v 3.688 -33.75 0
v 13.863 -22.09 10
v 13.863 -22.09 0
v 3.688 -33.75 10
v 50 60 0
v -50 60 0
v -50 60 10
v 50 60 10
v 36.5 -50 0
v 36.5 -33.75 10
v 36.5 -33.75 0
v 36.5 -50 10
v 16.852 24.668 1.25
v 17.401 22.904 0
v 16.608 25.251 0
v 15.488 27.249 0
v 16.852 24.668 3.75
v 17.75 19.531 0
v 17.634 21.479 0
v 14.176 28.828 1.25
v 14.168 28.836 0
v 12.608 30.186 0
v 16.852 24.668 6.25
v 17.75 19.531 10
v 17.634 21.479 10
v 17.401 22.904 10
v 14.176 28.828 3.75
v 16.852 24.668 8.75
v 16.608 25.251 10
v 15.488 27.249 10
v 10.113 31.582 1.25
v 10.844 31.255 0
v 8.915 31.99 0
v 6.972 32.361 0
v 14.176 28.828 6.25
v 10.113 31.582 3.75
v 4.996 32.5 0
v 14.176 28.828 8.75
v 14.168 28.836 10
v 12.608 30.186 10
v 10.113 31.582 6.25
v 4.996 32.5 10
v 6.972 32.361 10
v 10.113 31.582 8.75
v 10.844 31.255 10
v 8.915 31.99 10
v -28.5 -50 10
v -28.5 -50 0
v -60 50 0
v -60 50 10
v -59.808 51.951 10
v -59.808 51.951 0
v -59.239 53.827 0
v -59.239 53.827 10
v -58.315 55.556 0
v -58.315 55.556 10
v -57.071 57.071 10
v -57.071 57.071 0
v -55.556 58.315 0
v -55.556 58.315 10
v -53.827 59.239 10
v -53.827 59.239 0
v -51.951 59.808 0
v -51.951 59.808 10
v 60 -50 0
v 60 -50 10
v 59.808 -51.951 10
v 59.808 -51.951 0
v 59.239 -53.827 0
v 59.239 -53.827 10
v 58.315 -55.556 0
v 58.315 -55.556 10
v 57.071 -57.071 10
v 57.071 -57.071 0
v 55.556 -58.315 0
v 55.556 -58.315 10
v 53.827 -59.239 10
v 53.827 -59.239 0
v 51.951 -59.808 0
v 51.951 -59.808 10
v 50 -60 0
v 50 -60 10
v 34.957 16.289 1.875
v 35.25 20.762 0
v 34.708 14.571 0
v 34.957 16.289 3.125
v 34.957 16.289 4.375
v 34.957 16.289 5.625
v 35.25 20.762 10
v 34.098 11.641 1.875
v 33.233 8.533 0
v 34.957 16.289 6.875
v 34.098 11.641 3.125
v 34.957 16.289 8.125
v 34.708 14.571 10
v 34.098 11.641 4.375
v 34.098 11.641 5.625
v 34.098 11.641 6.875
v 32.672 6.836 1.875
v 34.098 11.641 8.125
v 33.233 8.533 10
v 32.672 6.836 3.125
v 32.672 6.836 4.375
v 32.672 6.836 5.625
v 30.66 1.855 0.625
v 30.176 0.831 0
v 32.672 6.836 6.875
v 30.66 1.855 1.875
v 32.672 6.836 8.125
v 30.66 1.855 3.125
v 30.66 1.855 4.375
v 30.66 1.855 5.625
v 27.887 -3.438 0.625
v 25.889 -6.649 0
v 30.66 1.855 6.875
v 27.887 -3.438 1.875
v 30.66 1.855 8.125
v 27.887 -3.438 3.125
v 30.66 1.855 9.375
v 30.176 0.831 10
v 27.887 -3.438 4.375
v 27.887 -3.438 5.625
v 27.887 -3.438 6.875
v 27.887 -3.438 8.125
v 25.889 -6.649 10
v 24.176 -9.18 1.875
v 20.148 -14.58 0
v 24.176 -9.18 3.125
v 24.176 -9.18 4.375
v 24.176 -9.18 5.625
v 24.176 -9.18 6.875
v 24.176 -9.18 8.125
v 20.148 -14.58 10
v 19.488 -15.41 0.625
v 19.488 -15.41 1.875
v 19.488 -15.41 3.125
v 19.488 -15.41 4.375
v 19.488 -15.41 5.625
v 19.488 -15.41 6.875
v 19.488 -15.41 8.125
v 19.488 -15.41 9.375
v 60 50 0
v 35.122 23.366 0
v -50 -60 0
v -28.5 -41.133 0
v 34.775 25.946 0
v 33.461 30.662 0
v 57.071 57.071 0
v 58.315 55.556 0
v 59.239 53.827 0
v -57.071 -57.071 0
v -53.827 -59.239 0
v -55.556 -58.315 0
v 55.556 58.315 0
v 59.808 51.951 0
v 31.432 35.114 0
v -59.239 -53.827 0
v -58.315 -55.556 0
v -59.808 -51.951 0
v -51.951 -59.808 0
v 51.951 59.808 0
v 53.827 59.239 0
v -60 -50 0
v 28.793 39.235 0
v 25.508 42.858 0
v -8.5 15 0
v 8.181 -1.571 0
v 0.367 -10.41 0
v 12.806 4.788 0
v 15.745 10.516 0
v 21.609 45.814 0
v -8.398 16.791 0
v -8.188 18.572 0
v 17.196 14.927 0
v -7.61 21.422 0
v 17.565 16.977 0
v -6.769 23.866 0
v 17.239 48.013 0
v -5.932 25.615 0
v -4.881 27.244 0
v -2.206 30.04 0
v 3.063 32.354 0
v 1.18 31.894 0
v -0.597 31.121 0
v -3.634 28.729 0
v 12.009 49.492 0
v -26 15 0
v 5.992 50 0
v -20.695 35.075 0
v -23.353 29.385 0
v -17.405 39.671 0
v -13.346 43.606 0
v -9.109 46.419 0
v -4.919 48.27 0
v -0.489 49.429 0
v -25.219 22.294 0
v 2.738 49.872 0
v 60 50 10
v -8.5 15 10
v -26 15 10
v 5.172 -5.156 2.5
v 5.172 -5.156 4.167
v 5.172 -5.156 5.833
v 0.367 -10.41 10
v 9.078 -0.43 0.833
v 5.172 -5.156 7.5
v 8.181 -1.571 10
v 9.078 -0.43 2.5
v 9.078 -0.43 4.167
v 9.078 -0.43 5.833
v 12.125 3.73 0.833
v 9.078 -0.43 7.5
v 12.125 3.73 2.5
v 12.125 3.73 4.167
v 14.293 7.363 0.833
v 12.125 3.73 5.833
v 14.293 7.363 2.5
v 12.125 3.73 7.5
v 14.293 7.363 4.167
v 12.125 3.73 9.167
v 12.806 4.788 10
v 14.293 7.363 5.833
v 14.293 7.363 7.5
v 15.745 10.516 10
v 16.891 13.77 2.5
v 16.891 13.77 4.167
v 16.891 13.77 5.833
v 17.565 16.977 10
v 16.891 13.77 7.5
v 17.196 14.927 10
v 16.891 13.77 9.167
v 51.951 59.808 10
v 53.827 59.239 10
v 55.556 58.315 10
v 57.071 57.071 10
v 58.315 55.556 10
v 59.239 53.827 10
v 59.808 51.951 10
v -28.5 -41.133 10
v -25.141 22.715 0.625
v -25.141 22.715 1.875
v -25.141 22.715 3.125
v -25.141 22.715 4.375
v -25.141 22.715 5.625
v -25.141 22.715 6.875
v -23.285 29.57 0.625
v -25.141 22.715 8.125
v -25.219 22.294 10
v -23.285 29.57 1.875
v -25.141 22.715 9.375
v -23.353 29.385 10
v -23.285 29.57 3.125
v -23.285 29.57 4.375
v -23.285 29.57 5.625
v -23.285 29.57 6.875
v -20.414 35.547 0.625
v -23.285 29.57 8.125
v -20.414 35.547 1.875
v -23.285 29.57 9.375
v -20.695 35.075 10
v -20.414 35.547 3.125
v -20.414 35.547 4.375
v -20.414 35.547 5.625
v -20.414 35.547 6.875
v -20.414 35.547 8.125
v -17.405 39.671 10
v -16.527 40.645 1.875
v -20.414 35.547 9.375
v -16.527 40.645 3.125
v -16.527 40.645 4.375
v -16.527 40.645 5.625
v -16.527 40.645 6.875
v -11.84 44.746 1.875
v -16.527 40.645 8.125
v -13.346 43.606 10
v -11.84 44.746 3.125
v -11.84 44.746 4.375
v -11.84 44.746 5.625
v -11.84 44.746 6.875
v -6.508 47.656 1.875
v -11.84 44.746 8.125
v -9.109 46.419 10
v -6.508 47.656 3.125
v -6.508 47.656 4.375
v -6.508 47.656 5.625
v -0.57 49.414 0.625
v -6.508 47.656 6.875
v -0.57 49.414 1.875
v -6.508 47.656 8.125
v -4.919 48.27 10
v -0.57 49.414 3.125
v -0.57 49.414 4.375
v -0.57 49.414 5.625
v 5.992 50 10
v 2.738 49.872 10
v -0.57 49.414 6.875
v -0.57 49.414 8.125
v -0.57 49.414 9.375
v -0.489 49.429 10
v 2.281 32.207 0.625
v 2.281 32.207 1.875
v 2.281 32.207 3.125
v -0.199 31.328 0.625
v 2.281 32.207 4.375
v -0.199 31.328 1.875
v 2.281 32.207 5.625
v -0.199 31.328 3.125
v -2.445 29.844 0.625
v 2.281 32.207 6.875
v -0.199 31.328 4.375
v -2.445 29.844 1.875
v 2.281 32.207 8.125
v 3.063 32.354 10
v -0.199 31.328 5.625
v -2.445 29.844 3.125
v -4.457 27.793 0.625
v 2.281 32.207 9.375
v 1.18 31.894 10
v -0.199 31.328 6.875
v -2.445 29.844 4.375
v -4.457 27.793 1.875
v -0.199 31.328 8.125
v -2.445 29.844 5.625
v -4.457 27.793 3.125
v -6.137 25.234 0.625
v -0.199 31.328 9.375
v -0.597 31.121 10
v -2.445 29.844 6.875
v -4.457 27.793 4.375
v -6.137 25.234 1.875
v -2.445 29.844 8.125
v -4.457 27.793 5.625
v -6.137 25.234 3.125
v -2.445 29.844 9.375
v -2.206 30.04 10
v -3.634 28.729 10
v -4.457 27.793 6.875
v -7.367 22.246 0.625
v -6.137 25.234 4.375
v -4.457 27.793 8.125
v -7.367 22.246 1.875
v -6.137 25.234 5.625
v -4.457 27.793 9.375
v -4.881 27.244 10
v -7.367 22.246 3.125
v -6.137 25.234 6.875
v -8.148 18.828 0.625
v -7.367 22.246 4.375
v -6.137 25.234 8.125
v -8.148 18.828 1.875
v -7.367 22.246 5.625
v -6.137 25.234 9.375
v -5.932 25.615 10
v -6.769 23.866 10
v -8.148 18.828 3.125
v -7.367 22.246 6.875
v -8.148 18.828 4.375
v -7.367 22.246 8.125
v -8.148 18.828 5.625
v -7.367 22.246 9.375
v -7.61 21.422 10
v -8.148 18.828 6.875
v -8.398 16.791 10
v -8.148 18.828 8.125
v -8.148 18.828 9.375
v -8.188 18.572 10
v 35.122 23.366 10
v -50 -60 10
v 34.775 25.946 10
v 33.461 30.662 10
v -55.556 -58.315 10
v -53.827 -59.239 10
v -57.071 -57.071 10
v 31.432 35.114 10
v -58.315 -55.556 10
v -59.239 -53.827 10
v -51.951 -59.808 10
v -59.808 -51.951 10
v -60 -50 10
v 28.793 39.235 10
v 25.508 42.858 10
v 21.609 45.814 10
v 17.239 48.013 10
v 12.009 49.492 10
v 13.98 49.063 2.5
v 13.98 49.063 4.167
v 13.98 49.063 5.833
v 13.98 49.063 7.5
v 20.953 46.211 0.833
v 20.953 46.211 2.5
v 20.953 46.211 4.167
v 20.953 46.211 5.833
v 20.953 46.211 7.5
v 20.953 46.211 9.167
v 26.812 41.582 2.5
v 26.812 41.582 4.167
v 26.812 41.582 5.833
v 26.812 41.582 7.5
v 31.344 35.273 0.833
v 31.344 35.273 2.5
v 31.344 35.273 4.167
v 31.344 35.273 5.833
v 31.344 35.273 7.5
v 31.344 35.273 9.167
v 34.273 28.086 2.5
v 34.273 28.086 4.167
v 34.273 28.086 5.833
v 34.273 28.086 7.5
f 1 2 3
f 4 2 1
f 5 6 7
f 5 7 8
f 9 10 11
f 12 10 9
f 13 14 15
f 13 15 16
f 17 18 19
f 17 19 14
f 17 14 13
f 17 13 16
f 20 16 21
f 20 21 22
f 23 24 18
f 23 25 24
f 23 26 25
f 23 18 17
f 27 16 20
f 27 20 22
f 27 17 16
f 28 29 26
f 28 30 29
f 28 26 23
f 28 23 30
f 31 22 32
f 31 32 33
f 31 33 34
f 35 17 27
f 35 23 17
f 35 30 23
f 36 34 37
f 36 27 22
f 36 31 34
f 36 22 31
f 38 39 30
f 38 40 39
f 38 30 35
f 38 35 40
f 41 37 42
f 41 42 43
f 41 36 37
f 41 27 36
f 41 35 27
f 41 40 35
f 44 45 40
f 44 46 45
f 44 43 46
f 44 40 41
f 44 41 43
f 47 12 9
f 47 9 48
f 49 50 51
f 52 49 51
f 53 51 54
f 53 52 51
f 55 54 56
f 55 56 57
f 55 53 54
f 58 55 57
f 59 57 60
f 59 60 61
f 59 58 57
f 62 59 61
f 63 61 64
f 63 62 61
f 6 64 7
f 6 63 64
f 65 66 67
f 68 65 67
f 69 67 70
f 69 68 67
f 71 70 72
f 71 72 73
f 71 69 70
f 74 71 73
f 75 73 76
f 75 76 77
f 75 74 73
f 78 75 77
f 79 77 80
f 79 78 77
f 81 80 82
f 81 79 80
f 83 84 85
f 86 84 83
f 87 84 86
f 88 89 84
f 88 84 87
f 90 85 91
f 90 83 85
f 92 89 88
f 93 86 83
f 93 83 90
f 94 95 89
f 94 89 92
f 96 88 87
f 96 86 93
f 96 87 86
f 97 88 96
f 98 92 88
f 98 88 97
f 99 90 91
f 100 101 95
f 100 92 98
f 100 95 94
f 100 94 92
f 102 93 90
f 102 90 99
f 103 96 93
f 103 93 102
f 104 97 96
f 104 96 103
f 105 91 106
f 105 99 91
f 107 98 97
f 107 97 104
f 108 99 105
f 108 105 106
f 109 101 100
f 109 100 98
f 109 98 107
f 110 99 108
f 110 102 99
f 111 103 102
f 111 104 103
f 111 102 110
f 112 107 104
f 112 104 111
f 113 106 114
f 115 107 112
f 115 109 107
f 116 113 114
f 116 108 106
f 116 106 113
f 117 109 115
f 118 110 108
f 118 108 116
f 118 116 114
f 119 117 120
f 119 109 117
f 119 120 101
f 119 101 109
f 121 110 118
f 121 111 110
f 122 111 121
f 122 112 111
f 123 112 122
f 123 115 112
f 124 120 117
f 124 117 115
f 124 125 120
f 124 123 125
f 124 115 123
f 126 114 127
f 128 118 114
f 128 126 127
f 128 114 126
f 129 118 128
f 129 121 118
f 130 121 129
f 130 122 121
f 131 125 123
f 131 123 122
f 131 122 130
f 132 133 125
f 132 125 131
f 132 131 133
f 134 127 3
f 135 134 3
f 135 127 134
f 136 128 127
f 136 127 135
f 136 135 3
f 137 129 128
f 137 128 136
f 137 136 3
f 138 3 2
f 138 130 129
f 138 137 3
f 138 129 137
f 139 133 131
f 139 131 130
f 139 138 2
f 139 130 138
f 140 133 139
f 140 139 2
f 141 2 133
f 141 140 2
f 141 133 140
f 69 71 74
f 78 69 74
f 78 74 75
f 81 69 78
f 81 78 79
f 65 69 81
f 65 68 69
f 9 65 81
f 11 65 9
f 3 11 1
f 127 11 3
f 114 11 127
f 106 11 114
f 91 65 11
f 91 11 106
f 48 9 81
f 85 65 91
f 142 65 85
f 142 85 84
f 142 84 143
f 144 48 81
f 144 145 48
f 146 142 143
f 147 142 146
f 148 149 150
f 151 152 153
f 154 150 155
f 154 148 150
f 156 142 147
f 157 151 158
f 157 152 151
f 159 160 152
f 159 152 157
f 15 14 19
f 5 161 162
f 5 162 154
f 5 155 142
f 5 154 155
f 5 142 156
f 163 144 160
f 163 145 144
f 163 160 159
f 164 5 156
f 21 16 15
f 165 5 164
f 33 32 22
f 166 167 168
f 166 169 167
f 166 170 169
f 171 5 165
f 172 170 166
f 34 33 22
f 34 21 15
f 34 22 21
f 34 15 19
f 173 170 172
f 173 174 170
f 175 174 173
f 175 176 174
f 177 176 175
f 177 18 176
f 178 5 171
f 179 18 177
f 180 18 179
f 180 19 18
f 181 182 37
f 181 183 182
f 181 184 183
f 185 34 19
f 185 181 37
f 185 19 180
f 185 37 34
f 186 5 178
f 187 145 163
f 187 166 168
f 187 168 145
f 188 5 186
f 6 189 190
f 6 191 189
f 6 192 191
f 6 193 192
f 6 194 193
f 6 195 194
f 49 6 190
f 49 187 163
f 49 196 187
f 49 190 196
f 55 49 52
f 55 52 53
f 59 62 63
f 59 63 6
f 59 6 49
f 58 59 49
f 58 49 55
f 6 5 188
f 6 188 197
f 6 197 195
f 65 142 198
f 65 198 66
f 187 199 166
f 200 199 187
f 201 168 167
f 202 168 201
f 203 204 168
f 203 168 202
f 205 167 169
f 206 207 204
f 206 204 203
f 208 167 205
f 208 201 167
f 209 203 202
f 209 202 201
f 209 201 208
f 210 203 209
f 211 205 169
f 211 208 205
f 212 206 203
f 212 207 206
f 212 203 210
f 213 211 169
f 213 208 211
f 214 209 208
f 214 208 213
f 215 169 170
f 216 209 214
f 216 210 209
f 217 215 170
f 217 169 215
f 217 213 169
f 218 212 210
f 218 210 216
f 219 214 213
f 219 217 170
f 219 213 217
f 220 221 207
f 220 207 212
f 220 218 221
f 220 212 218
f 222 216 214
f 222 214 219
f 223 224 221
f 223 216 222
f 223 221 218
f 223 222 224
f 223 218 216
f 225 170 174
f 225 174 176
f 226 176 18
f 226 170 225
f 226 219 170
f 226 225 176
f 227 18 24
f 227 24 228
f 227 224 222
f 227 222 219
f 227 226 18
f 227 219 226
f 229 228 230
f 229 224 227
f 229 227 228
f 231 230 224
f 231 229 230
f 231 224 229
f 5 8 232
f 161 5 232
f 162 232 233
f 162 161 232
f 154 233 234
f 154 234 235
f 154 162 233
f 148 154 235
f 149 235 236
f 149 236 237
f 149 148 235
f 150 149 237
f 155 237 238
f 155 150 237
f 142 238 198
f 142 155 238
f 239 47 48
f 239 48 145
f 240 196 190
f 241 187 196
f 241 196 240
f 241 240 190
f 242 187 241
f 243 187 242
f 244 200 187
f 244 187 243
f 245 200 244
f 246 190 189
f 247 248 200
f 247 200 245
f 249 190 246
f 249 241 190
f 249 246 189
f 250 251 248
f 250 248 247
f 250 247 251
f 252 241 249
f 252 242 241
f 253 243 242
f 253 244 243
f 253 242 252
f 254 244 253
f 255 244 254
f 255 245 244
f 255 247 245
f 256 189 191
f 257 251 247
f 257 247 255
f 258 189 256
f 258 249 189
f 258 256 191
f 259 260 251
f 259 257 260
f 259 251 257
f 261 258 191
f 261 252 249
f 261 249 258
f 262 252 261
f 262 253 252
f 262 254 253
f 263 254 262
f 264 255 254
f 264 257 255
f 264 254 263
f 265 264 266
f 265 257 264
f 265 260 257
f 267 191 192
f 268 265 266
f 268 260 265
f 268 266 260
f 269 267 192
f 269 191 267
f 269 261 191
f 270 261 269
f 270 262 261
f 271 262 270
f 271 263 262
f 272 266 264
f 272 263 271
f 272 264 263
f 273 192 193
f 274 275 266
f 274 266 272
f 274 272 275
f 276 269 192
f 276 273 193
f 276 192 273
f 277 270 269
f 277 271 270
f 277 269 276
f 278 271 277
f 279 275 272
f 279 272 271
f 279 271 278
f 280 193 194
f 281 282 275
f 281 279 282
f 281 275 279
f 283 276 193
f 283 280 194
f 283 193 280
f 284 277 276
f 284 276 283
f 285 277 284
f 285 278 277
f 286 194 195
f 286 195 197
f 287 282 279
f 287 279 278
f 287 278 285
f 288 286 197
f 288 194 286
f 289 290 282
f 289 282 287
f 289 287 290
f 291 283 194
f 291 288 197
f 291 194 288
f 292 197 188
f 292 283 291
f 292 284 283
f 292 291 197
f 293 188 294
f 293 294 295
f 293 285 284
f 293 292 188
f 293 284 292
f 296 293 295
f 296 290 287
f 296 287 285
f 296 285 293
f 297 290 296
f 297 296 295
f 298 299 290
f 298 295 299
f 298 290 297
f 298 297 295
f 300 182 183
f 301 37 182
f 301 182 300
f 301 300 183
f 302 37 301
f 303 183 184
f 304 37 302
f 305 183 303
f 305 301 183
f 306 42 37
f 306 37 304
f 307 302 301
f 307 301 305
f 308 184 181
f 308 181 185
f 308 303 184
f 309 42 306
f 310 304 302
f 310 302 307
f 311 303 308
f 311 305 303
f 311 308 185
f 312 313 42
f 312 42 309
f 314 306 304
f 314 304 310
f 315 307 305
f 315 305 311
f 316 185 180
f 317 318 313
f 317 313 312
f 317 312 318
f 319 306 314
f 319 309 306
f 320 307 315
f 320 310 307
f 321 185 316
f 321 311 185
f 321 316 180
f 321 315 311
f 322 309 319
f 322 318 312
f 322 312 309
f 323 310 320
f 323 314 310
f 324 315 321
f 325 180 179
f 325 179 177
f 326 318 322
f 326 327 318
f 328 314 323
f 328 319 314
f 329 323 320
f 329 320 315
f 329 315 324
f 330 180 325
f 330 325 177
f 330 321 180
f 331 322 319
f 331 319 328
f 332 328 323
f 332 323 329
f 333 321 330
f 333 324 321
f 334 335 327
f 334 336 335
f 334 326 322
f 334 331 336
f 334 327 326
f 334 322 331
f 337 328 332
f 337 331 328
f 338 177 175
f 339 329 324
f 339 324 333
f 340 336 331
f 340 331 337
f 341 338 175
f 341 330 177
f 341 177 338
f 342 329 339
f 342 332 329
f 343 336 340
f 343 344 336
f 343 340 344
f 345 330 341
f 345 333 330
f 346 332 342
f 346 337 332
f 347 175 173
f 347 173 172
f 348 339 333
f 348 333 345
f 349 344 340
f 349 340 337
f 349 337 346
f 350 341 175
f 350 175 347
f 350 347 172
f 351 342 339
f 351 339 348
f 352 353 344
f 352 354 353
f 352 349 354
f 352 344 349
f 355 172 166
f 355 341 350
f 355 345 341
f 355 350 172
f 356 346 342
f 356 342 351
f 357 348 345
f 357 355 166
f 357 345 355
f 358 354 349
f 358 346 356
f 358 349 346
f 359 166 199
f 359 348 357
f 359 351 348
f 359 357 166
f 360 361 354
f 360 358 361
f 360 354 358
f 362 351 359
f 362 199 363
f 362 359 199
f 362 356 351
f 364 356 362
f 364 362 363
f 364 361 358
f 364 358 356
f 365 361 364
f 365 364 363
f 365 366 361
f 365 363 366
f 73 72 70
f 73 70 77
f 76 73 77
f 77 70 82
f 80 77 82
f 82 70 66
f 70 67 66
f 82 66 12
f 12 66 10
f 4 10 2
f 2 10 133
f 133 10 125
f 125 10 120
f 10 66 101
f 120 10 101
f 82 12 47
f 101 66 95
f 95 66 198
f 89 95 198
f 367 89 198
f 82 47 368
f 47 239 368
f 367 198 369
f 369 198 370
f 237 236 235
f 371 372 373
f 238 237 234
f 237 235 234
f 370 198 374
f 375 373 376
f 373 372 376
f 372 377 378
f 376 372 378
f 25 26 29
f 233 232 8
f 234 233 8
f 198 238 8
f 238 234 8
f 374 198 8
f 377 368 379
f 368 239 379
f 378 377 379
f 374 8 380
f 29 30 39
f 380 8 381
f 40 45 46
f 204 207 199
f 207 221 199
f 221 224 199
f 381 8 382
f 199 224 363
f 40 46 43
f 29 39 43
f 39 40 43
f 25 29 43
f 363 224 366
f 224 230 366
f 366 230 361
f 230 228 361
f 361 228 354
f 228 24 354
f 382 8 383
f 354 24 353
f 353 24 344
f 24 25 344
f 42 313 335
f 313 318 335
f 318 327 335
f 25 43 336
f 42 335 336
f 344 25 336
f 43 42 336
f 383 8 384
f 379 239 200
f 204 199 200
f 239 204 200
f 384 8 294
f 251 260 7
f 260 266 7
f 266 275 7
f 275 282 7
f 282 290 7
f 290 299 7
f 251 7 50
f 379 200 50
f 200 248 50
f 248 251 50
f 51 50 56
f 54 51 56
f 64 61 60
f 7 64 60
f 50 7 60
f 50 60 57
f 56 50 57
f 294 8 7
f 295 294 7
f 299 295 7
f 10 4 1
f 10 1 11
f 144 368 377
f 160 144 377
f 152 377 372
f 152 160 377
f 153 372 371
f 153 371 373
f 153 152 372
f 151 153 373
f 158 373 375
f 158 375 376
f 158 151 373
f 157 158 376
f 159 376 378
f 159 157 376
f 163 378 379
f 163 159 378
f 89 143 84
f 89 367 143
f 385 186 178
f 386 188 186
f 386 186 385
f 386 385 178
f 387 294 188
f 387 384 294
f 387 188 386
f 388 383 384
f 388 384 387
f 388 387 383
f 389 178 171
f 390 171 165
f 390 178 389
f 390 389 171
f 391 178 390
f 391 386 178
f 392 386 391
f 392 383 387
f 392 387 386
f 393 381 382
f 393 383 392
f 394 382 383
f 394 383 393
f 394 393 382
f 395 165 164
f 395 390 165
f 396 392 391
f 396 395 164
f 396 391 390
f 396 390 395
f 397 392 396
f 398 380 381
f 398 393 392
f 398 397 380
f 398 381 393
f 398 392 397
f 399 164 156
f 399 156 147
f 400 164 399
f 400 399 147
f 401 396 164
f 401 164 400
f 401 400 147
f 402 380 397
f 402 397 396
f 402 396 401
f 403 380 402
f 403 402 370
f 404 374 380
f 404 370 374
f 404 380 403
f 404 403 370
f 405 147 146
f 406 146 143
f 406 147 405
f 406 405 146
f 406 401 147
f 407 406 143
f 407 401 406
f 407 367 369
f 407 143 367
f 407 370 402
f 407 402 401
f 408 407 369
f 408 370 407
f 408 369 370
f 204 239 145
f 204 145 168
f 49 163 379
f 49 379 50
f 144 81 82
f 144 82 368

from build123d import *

# Parameters (mm, degrees)
BOSS_EXTRUDE1_DEPTH = 10
CUT_EXTRUDE3_DEPTH  = 10


with BuildPart() as part:
    # Sketch1 → Boss-Extrude1 (new body)
    with BuildSketch(Plane.XY):
        with BuildLine():
            Line((-50, 60), (50, 60))
            ThreePointArc((50, 60), (57.071067812, 57.071067812), (60, 50))
            Line((60, 50), (60, -50))
            ThreePointArc((60, -50), (57.071067812, -57.071067812), (50, -60))
            Line((50, -60), (-50, -60))
            ThreePointArc((-50, -60), (-57.071067812, -57.071067812), (-60, -50))
            Line((-60, -50), (-60, 50))
            ThreePointArc((-60, 50), (-57.071067812, 57.071067812), (-50, 60))
        make_face()
    extrude(amount=BOSS_EXTRUDE1_DEPTH)

    # Sketch2 → Cut-Extrude3 (cut)
    with BuildSketch(Plane.XY.offset(10)):
        with BuildLine():
            Line((-8.5, 15), (-26, 15))
            add(Edge.make_bspline(
                [(-26, 15), (-25.924420184, 16.323782417), (-25.776741761, 18.910373782), (-25.18931432, 22.667480561), (-24.40218171, 26.217533319), (-23.351648748, 29.548113585), (-22.031585343, 32.658011133), (-20.475960128, 35.557827774), (-18.645030413, 38.232295908), (-16.577764404, 40.66851774), (-14.30925859, 42.854074827), (-11.88660938, 44.791927043), (-9.27275909, 46.390993922), (-6.515464901, 47.70687792), (-3.615196326, 48.758208087), (-0.544512267, 49.461107381), (2.66999963, 49.937117669), (4.870593326, 49.978770479), (5.9921875, 50)],
                knots=[0, 0, 0, 0, 1.199038563, 2.342849363, 3.436047546, 4.486744587, 5.497670872, 6.488682221, 7.459191391, 8.424610317, 9.374430501, 10.305433194, 11.225809216, 12.140057399, 13.06607119, 14.010487599, 14.985989317, 16, 16, 16, 16], degree=3))
            add(Edge.make_bspline(
                [(5.9921875, 50), (7.368928437, 49.957042053), (10.056649381, 49.873178074), (13.962121102, 49.157790502), (17.609404678, 47.961194237), (20.995848876, 46.289233684), (24.092624303, 44.165183063), (26.899217428, 41.632600324), (29.3307524, 38.638350552), (31.402645865, 35.307019593), (33.124141711, 31.779608953), (34.330494291, 28.132120076), (35.123416859, 24.461342527), (35.207986958, 21.989626722), (35.25, 20.76171875)],
                knots=[0, 0, 0, 0, 1.075374347, 2.099382735, 3.09057751, 4.06680945, 5.040638231, 6.016817125, 7.011024321, 8.044445721, 9.0776792, 10.070479129, 11.0414456, 12, 12, 12, 12], degree=3))
            add(Edge.make_bspline(
                [(35.25, 20.76171875), (35.23364234, 20.018993224), (35.200718412, 18.524070203), (34.971793962, 16.261884765), (34.628362052, 13.957584415), (34.110550426, 11.613144874), (33.464796878, 9.227908959), (32.681404487, 6.794738479), (31.742201696, 4.327428619), (30.662861893, 1.798210228), (29.375206772, -0.801128076), (27.875911369, -3.509551386), (26.125180985, -6.324657117), (24.144162236, -9.262340273), (21.923233789, -12.317967673), (19.451553804, -15.482334813), (16.757590231, -18.766591913), (14.845608498, -20.961933477), (13.86328125, -22.08984375)],
                knots=[0, 0, 0, 0, 0.728284026, 1.46585585, 2.227944881, 3.01186502, 3.81876927, 4.650621989, 5.517437689, 6.406905708, 7.346299482, 8.360816762, 9.441613733, 10.596154504, 11.834900912, 13.145207542, 14.533280747, 16, 16, 16, 16], degree=3))
            Line((13.86328125, -22.08984375), (3.6875, -33.75))
            Line((3.6875, -33.75), (36.5, -33.75))
            Line((36.5, -33.75), (36.5, -50))
            Line((36.5, -50), (-28.5, -50))
            Line((-28.5, -50), (-28.5, -41.1328125))
            Line((-28.5, -41.1328125), (0.3671875, -10.41015625))
            add(Edge.make_bspline(
                [(0.3671875, -10.41015625), (1.20296676, -9.513966827), (2.821623334, -7.778313684), (5.124804826, -5.229322392), (7.208980625, -2.810390499), (9.03093365, -0.495761262), (10.686277651, 1.639488168), (12.101200969, 3.659716873), (13.288649043, 5.546661257), (14.577792347, 7.821986632), (15.802054714, 10.535717034), (16.925389532, 13.662045728), (17.61013984, 16.650095948), (17.704657037, 18.597173702), (17.75, 19.53125)],
                knots=[0, 0, 0, 0, 1.246127091, 2.413378631, 3.493388633, 4.492180848, 5.408488754, 6.240484944, 6.999099869, 7.674939598, 8.898438119, 10.020720584, 11.050475521, 12, 12, 12, 12], degree=3))
            add(Edge.make_bspline(
                [(17.75, 19.53125), (17.716098162, 20.434896755), (17.650407917, 22.185857222), (16.928525346, 24.676589164), (15.810159831, 26.931692678), (14.234224873, 28.883782729), (12.325274062, 30.487944566), (10.119302085, 31.681075072), (7.634294101, 32.369505905), (5.892256158, 32.45567285), (4.99609375, 32.5)],
                knots=[0, 0, 0, 0, 1.062038974, 2.057870785, 3.028805853, 4.01125022, 4.991535629, 5.949134679, 6.94496649, 8, 8, 8, 8], degree=3))
            add(Edge.make_bspline(
                [(4.99609375, 32.5), (4.533124834, 32.48362502), (3.621696175, 32.451388241), (2.281967285, 32.23679673), (1.007118995, 31.858601591), (-0.217038468, 31.351873335), (-1.377440572, 30.680201393), (-2.471160416, 29.852258715), (-3.50972172, 28.889085204), (-4.488361226, 27.793692576), (-5.379050933, 26.571234082), (-6.170158274, 25.23287438), (-6.824272345, 23.77944423), (-7.400178148, 22.230131129), (-7.84434426, 20.568294193), (-8.167752291, 18.803879329), (-8.413617819, 16.93975701), (-8.470682125, 15.658348204), (-8.5, 15)],
                knots=[0, 0, 0, 0, 0.903469896, 1.778625579, 2.63899355, 3.493148037, 4.358286772, 5.247621495, 6.164656832, 7.118446693, 8.109501108, 9.111810964, 10.146451449, 11.215617525, 12.33435995, 13.498009769, 14.714554818, 16, 16, 16, 16], degree=3))
        make_face()
    extrude(amount=-CUT_EXTRUDE3_DEPTH, mode=Mode.SUBTRACT)


solid = part.part
